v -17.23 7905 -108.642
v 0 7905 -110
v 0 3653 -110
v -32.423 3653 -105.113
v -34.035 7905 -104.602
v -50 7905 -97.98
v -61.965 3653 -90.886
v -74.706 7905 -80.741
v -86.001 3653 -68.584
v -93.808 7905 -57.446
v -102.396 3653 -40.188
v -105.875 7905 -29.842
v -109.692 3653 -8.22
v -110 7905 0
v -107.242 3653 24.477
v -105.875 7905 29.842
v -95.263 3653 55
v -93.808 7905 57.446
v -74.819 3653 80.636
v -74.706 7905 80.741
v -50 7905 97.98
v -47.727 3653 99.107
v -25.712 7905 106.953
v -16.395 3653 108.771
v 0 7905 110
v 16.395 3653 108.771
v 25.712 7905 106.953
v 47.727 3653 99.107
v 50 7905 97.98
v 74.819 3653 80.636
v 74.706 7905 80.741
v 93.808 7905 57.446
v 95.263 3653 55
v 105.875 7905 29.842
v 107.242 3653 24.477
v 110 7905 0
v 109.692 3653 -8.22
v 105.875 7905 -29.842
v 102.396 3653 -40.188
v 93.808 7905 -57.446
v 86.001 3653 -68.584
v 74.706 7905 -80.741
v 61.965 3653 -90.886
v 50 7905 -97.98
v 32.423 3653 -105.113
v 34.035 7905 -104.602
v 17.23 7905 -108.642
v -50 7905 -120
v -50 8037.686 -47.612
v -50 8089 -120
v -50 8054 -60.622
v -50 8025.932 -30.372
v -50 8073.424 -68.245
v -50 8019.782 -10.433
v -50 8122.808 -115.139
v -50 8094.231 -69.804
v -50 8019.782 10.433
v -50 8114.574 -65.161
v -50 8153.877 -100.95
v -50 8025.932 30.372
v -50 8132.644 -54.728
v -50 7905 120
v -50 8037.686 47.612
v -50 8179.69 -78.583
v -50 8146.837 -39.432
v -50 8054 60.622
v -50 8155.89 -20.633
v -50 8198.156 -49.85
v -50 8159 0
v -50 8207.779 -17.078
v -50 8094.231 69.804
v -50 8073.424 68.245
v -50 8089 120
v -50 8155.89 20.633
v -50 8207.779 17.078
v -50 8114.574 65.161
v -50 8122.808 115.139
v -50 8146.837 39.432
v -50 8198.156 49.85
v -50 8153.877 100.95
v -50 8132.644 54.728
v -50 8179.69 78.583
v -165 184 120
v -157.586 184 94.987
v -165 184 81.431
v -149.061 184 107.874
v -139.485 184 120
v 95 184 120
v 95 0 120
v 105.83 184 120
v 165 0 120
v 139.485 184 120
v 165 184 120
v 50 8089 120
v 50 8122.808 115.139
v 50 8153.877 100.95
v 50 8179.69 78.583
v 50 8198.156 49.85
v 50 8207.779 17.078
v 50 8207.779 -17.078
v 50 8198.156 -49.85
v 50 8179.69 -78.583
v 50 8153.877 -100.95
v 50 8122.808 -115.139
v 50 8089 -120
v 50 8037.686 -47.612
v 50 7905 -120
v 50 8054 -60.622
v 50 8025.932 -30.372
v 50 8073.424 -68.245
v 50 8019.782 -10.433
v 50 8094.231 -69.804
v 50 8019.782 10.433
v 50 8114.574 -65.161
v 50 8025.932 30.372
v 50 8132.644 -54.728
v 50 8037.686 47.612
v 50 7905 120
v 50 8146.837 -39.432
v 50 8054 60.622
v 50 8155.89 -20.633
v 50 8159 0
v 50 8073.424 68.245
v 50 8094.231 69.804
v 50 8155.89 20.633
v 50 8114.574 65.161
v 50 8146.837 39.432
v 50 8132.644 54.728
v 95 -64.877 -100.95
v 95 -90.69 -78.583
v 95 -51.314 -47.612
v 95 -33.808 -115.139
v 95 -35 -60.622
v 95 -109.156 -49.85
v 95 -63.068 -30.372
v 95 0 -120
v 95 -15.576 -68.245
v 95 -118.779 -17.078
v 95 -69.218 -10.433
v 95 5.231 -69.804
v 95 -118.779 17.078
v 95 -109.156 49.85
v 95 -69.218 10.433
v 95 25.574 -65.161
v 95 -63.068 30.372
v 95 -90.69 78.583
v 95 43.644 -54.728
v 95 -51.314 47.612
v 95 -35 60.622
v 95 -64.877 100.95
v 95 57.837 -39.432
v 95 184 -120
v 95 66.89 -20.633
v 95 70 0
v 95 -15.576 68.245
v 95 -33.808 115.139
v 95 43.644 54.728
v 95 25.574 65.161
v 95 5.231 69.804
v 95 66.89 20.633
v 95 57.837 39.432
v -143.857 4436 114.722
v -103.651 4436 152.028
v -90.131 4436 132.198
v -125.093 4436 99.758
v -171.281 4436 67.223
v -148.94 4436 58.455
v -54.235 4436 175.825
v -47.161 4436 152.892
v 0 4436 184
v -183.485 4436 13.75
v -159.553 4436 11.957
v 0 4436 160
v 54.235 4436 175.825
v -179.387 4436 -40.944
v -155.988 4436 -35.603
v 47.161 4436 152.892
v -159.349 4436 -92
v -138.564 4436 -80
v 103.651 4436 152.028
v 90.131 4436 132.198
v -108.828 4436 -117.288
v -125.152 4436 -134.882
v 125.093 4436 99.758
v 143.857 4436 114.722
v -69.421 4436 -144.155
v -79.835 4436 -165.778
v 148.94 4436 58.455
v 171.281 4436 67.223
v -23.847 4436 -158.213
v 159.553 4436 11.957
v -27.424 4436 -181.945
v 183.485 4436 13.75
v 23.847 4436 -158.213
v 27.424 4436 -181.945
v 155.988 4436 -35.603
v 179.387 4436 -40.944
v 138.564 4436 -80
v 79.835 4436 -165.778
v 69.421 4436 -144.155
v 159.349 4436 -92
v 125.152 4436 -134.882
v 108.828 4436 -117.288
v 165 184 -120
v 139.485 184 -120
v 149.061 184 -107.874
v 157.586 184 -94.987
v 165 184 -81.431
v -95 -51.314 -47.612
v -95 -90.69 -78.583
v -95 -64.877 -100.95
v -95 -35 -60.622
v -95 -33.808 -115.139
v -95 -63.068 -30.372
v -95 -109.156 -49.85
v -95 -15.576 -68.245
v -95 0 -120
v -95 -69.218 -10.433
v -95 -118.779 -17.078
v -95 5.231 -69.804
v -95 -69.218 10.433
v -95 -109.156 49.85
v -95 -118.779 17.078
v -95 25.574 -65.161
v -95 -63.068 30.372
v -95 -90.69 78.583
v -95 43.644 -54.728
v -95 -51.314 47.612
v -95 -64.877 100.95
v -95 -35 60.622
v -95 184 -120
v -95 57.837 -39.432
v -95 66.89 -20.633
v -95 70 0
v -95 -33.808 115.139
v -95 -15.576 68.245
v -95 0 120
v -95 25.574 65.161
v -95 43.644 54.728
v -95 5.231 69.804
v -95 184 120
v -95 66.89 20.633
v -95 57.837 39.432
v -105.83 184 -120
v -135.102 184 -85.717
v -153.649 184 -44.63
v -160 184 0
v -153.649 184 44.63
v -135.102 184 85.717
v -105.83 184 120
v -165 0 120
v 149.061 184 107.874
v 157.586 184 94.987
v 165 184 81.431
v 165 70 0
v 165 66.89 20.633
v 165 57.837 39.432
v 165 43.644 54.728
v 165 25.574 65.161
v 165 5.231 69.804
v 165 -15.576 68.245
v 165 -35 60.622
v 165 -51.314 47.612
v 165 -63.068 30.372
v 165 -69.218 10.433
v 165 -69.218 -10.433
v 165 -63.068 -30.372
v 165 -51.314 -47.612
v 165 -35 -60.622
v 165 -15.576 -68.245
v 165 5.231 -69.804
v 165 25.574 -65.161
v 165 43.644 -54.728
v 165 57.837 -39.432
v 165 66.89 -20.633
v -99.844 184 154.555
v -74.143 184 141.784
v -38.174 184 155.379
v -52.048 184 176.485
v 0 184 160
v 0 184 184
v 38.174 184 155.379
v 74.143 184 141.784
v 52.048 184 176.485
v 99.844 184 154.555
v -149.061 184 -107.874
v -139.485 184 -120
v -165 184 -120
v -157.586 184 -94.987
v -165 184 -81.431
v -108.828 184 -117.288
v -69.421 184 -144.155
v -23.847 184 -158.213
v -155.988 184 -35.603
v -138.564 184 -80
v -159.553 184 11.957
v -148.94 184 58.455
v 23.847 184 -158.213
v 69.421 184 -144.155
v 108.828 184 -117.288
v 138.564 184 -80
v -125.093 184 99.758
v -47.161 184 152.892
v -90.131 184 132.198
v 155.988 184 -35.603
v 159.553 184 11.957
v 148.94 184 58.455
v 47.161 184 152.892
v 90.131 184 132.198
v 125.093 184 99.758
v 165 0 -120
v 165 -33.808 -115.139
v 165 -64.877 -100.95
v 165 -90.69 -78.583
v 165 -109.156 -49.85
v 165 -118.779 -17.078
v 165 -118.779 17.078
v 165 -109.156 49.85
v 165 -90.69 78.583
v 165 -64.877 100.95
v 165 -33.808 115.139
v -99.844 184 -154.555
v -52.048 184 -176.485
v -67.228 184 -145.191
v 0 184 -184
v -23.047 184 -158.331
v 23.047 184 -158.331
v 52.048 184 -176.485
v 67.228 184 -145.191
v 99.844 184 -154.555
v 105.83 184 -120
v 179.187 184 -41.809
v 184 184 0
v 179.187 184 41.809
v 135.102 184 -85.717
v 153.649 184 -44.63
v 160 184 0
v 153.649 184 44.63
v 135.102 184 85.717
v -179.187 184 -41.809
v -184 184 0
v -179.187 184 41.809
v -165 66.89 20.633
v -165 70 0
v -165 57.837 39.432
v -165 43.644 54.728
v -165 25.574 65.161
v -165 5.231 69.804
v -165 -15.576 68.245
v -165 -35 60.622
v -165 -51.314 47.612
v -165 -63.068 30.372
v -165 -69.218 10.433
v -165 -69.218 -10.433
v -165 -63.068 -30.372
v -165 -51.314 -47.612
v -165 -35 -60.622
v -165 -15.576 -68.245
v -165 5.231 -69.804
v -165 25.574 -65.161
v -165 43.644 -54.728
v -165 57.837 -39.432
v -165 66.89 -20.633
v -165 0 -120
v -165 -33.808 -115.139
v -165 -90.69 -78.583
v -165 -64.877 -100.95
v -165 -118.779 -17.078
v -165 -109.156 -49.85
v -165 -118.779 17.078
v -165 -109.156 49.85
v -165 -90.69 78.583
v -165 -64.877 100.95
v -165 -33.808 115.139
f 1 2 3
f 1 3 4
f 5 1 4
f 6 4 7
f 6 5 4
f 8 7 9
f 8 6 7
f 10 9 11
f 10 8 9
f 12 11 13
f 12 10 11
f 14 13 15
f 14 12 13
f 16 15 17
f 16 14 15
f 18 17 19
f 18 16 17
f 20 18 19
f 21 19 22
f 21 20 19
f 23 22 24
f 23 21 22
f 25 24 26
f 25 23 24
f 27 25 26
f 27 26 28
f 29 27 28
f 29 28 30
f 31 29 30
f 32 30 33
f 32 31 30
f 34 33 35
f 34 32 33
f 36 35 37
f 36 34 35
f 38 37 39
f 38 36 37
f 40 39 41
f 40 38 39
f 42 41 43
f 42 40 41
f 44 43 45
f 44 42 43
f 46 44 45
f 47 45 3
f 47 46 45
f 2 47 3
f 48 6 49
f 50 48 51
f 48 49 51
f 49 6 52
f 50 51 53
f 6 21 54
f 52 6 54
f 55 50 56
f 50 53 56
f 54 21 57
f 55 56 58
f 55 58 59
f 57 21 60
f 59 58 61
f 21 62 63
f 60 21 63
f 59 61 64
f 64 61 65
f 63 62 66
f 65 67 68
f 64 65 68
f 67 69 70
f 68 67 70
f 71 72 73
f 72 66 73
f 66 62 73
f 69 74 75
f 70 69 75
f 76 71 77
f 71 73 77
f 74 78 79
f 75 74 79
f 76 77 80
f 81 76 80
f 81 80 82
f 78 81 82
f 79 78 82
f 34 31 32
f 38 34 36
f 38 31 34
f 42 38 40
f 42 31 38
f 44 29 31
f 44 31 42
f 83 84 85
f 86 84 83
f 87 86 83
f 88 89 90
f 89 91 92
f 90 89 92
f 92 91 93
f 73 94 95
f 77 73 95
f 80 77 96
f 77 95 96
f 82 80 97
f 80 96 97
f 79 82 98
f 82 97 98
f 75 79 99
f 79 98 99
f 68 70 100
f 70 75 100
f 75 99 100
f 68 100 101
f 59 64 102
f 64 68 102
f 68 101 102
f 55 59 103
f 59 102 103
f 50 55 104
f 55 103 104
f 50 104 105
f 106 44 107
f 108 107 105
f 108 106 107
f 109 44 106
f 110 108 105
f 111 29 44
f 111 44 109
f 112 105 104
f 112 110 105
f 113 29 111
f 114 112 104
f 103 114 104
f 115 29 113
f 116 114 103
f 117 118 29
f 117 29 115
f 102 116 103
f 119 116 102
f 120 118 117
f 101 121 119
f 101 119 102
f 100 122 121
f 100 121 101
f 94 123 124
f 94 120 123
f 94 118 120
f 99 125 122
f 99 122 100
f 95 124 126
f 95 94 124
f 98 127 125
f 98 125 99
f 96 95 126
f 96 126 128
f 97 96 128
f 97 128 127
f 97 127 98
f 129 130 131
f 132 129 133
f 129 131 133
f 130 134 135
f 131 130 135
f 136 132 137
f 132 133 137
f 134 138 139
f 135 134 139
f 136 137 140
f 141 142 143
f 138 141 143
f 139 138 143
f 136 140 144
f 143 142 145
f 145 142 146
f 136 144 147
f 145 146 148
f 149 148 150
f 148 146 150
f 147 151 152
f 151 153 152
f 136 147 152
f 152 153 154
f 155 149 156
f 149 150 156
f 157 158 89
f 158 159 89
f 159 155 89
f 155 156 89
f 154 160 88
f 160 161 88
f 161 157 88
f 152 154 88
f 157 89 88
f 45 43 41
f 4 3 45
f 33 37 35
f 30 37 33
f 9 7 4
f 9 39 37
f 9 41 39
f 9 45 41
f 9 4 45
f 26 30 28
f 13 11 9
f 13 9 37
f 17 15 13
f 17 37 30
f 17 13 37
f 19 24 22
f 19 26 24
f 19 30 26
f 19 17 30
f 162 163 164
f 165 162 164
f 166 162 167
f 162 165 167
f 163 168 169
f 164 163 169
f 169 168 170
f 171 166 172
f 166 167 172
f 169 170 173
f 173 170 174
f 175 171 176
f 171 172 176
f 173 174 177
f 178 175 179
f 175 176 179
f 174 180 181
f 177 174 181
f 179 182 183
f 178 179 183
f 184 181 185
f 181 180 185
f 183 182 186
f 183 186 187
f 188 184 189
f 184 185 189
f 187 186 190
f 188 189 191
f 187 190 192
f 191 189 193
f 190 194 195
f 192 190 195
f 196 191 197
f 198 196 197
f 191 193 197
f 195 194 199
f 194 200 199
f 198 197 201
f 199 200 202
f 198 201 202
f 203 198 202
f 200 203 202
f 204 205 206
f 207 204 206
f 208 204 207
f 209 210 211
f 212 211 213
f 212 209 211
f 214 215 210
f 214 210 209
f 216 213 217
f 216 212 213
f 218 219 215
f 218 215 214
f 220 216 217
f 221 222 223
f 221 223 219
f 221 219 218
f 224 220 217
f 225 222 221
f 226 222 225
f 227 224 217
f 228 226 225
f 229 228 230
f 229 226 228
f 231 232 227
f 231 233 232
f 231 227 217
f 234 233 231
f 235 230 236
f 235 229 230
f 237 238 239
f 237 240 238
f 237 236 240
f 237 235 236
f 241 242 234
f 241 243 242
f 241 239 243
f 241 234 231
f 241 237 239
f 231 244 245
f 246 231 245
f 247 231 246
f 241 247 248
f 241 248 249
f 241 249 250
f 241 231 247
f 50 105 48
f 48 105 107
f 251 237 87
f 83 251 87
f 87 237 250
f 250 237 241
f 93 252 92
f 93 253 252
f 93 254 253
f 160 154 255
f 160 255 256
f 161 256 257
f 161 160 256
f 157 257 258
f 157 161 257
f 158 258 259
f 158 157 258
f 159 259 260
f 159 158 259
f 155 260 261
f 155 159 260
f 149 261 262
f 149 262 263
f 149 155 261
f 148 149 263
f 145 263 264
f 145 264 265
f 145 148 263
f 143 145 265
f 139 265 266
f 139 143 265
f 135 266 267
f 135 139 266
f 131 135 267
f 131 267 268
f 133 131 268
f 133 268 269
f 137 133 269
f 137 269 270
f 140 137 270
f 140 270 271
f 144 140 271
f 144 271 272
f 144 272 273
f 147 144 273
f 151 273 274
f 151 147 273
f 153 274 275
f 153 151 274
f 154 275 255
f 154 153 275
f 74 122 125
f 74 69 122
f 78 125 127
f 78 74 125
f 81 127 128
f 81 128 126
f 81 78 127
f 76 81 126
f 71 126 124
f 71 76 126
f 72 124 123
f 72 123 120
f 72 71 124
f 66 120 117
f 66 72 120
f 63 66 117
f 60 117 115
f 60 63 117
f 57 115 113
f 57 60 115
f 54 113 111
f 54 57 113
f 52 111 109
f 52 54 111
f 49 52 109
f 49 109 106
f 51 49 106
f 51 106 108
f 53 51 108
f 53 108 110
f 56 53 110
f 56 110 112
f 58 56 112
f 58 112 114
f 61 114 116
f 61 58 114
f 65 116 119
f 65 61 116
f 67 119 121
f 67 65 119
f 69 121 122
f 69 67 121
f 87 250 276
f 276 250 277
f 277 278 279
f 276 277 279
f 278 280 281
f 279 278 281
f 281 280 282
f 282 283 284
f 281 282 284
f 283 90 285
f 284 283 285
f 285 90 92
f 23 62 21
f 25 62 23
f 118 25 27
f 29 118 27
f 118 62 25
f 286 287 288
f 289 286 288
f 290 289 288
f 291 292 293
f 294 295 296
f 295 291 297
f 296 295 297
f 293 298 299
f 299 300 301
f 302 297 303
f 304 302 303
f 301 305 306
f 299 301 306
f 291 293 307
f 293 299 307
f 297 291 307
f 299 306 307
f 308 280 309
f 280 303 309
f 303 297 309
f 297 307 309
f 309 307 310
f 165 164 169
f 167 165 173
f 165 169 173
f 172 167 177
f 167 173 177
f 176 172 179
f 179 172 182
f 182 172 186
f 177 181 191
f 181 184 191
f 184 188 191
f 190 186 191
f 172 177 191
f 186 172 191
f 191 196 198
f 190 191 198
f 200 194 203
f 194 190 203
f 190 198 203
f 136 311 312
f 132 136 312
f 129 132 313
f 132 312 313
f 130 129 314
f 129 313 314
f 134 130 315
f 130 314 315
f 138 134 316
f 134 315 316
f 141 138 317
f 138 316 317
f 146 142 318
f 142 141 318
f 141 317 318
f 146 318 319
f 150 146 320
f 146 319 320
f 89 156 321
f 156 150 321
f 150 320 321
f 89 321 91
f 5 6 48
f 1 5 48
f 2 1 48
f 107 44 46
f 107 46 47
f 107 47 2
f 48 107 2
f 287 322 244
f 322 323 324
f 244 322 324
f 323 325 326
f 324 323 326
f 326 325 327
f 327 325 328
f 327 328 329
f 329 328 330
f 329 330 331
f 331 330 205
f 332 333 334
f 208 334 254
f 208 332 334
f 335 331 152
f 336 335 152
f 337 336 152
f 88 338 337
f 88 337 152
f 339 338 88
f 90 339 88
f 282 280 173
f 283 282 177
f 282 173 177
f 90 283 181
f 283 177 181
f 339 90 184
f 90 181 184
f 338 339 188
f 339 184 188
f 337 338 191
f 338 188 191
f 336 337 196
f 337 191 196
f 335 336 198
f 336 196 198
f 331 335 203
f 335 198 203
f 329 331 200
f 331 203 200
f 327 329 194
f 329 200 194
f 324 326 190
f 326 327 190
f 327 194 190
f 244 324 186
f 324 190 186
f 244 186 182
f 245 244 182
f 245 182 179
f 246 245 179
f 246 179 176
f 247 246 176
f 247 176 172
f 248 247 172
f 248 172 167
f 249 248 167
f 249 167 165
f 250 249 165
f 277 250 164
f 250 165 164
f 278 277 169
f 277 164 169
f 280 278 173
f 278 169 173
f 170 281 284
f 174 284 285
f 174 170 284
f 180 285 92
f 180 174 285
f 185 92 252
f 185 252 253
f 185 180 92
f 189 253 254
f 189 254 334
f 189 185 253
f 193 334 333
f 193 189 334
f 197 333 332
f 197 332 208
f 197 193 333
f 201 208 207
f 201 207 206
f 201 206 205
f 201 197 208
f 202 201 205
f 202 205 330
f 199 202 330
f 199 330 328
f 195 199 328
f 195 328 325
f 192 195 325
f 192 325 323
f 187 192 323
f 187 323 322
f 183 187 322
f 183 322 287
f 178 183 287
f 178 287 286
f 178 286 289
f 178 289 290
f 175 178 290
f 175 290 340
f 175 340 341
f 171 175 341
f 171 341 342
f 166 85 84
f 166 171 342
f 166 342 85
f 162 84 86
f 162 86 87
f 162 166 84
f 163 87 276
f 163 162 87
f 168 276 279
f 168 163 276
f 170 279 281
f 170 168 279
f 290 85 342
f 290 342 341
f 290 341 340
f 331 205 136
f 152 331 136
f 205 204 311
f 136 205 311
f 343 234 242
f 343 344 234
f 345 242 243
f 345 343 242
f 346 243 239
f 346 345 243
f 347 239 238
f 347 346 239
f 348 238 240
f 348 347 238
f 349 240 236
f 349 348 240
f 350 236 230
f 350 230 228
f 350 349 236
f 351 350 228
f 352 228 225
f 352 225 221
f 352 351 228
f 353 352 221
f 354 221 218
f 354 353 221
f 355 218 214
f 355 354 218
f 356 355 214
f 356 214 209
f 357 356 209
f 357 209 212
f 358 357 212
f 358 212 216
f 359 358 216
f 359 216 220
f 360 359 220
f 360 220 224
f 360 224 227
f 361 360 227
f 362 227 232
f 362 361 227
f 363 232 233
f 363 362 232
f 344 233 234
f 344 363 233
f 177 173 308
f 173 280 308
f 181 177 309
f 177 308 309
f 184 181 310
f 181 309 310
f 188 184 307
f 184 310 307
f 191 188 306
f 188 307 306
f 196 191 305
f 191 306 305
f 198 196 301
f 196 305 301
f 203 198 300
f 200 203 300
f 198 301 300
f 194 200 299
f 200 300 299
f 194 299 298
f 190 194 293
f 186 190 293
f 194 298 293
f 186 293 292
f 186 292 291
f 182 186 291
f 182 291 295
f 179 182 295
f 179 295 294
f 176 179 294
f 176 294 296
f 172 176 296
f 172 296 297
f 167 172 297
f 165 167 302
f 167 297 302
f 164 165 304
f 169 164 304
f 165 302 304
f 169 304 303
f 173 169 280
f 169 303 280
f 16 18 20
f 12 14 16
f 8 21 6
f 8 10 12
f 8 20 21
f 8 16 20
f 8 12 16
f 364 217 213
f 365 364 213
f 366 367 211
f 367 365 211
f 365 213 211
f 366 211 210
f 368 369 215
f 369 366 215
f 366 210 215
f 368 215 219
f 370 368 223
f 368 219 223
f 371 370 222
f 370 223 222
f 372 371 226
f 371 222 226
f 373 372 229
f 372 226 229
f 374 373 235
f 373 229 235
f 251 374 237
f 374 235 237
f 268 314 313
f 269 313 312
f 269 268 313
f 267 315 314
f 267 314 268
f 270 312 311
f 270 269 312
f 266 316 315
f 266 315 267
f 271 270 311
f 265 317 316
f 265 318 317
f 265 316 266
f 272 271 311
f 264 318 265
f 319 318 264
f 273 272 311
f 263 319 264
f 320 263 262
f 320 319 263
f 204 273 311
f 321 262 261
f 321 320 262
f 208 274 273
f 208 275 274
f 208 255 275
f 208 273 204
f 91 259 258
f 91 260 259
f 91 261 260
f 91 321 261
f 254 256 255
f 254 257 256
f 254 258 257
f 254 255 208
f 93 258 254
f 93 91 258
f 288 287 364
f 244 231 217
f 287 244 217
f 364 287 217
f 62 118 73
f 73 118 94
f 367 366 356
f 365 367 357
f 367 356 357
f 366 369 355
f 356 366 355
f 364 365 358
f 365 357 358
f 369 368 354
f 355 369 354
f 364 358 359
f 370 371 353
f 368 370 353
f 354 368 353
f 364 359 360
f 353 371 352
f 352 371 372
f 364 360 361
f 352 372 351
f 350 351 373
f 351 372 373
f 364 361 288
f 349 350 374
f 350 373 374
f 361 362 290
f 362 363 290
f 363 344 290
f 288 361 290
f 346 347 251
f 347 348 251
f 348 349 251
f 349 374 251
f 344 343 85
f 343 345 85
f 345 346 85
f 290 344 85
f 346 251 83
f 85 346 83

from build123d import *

# Parameters (mm, degrees)
F0_W      = 4252
F0_H      = 24
F0_R      = 70
F3_DEPTH  = 165
F4_DEPTH  = 50
F6_DEPTH  = 95
F8_DEPTH  = 349.001
F10_DEPTH = 234.001


with BuildPart() as f1:
    # F0 (on Right) → F1 (revolve)
    with BuildSketch(Plane.YZ):
        with Locations((2310, 172)):
            Rectangle(F0_W, F0_H)
    revolve(axis=Axis((0, 2310, 0), (0, 1, 0)))

    # F0 (on Right) → F3 (join, symmetric)
    with BuildSketch(Plane.YZ):
        with BuildLine():
            ThreePointArc((0, -184), (130.1076477383, -130.1076477383), (184, 0))
            ThreePointArc((184, 0), (130.1076477383, 130.1076477383), (0, 184))
            ThreePointArc((0, 184), (-184, 0), (0, -184))
        make_face()
        Circle(F0_R, mode=Mode.SUBTRACT)
        with BuildLine():
            ThreePointArc((0, 184), (130.1076477383, 130.1076477383), (184, 0))
            Line((184, 0), (184, 160))
            Line((184, 160), (184, 184))
            Line((184, 184), (0, 184))
        make_face()
        with BuildLine():
            Line((184, -184), (184, 0))
            ThreePointArc((184, 0), (130.1076477383, -130.1076477383), (0, -184))
            Line((0, -184), (184, -184))
        make_face()
    extrude(amount=F3_DEPTH, both=True)

    # F0 (on Right) → F6 (cut, symmetric)
    with BuildSketch(Plane.YZ):
        with BuildLine():
            ThreePointArc((0, -184), (130.1076477383, -130.1076477383), (184, 0))
            ThreePointArc((184, 0), (130.1076477383, 130.1076477383), (0, 184))
            ThreePointArc((0, 184), (-184, 0), (0, -184))
        make_face()
        Circle(F0_R, mode=Mode.SUBTRACT)
        with BuildLine():
            ThreePointArc((0, 184), (130.1076477383, 130.1076477383), (184, 0))
            Line((184, 0), (184, 160))
            Line((184, 160), (184, 184))
            Line((184, 184), (0, 184))
        make_face()
        with BuildLine():
            Line((184, -184), (184, 0))
            ThreePointArc((184, 0), (130.1076477383, -130.1076477383), (0, -184))
            Line((0, -184), (184, -184))
        make_face()
    extrude(amount=F6_DEPTH, both=True, mode=Mode.SUBTRACT)

    # F7 (on face) → F8 (cut, through all)
    with BuildSketch(Plane.YZ.offset(165)):
        with BuildLine():
            ThreePointArc((0, -120), (-120, 0), (0, 120))
            Line((0, 120), (184, 120))
            Line((184, 120), (184, 184))
            Line((184, 184), (0, 184))
            ThreePointArc((0, 184), (-184, 0), (0, -184))
            Line((0, -184), (184, -184))
            Line((184, -184), (184, -120))
            Line((184, -120), (0, -120))
        make_face()
    extrude(amount=-F8_DEPTH, mode=Mode.SUBTRACT)


with BuildPart() as f2:
    # F0 (on Right) → F2 (revolve)
    with BuildSketch(Plane.YZ):
        Polygon((4436, 0), (3653, 0), (3653, -110), (7905, -110), (7905, 0), align=None)
    revolve(axis=Axis((0, 6170.5, 0), (0, 1, 0)))

    # F0 (on Right) → F4 (join, symmetric)
    with BuildSketch(Plane.YZ):
        with BuildLine():
            ThreePointArc((8089, 184), (7958.8923522617, 130.1076477383), (7905, 0))
            ThreePointArc((7905, 0), (7958.8923522617, -130.1076477383), (8089, -184))
            ThreePointArc((8089, -184), (8219.1076477383, -130.1076477383), (8273, 0))
            ThreePointArc((8273, 0), (8219.1076477383, 130.1076477383), (8089, 184))
        make_face()
        with Locations((8089, 0)):
            Circle(F0_R, mode=Mode.SUBTRACT)
        with BuildLine():
            Line((7905, 184), (7905, 0))
            ThreePointArc((7905, 0), (7958.8923522617, 130.1076477383), (8089, 184))
            Line((8089, 184), (7905, 184))
        make_face()
        with BuildLine():
            ThreePointArc((8089, -184), (7958.8923522617, -130.1076477383), (7905, 0))
            Line((7905, 0), (7905, -110))
            Line((7905, -110), (7905, -184))
            Line((7905, -184), (8089, -184))
        make_face()
    extrude(amount=F4_DEPTH, both=True)

    # F9 (on face) → F10 (cut, through all)
    with BuildSketch(Plane.YZ.offset(50)):
        with BuildLine():
            ThreePointArc((8089, 120), (8173.8528137424, 84.8528137424), (8209, 0))
            ThreePointArc((8209, 0), (8173.8528137424, -84.8528137424), (8089, -120))
            Line((8089, -120), (7905, -120))
            Line((7905, -120), (7905, -184))
            Line((7905, -184), (8089, -184))
            ThreePointArc((8089, -184), (8273, 0), (8089, 184))
            Line((8089, 184), (7905, 184))
            Line((7905, 184), (7905, 120))
            Line((7905, 120), (8089, 120))
        make_face()
    extrude(amount=-F10_DEPTH, mode=Mode.SUBTRACT)


with BuildPart() as f5:
    # F0 (on Right) → F5 (revolve)
    with BuildSketch(Plane.YZ):
        Polygon((184, 160), (184, 0), (3653, 0), (4436, 0), (4436, 160), align=None)
    revolve(axis=Axis((0, 2310, 0), (0, 1, 0)))


solid = Compound([f1.part, f2.part, f5.part])
